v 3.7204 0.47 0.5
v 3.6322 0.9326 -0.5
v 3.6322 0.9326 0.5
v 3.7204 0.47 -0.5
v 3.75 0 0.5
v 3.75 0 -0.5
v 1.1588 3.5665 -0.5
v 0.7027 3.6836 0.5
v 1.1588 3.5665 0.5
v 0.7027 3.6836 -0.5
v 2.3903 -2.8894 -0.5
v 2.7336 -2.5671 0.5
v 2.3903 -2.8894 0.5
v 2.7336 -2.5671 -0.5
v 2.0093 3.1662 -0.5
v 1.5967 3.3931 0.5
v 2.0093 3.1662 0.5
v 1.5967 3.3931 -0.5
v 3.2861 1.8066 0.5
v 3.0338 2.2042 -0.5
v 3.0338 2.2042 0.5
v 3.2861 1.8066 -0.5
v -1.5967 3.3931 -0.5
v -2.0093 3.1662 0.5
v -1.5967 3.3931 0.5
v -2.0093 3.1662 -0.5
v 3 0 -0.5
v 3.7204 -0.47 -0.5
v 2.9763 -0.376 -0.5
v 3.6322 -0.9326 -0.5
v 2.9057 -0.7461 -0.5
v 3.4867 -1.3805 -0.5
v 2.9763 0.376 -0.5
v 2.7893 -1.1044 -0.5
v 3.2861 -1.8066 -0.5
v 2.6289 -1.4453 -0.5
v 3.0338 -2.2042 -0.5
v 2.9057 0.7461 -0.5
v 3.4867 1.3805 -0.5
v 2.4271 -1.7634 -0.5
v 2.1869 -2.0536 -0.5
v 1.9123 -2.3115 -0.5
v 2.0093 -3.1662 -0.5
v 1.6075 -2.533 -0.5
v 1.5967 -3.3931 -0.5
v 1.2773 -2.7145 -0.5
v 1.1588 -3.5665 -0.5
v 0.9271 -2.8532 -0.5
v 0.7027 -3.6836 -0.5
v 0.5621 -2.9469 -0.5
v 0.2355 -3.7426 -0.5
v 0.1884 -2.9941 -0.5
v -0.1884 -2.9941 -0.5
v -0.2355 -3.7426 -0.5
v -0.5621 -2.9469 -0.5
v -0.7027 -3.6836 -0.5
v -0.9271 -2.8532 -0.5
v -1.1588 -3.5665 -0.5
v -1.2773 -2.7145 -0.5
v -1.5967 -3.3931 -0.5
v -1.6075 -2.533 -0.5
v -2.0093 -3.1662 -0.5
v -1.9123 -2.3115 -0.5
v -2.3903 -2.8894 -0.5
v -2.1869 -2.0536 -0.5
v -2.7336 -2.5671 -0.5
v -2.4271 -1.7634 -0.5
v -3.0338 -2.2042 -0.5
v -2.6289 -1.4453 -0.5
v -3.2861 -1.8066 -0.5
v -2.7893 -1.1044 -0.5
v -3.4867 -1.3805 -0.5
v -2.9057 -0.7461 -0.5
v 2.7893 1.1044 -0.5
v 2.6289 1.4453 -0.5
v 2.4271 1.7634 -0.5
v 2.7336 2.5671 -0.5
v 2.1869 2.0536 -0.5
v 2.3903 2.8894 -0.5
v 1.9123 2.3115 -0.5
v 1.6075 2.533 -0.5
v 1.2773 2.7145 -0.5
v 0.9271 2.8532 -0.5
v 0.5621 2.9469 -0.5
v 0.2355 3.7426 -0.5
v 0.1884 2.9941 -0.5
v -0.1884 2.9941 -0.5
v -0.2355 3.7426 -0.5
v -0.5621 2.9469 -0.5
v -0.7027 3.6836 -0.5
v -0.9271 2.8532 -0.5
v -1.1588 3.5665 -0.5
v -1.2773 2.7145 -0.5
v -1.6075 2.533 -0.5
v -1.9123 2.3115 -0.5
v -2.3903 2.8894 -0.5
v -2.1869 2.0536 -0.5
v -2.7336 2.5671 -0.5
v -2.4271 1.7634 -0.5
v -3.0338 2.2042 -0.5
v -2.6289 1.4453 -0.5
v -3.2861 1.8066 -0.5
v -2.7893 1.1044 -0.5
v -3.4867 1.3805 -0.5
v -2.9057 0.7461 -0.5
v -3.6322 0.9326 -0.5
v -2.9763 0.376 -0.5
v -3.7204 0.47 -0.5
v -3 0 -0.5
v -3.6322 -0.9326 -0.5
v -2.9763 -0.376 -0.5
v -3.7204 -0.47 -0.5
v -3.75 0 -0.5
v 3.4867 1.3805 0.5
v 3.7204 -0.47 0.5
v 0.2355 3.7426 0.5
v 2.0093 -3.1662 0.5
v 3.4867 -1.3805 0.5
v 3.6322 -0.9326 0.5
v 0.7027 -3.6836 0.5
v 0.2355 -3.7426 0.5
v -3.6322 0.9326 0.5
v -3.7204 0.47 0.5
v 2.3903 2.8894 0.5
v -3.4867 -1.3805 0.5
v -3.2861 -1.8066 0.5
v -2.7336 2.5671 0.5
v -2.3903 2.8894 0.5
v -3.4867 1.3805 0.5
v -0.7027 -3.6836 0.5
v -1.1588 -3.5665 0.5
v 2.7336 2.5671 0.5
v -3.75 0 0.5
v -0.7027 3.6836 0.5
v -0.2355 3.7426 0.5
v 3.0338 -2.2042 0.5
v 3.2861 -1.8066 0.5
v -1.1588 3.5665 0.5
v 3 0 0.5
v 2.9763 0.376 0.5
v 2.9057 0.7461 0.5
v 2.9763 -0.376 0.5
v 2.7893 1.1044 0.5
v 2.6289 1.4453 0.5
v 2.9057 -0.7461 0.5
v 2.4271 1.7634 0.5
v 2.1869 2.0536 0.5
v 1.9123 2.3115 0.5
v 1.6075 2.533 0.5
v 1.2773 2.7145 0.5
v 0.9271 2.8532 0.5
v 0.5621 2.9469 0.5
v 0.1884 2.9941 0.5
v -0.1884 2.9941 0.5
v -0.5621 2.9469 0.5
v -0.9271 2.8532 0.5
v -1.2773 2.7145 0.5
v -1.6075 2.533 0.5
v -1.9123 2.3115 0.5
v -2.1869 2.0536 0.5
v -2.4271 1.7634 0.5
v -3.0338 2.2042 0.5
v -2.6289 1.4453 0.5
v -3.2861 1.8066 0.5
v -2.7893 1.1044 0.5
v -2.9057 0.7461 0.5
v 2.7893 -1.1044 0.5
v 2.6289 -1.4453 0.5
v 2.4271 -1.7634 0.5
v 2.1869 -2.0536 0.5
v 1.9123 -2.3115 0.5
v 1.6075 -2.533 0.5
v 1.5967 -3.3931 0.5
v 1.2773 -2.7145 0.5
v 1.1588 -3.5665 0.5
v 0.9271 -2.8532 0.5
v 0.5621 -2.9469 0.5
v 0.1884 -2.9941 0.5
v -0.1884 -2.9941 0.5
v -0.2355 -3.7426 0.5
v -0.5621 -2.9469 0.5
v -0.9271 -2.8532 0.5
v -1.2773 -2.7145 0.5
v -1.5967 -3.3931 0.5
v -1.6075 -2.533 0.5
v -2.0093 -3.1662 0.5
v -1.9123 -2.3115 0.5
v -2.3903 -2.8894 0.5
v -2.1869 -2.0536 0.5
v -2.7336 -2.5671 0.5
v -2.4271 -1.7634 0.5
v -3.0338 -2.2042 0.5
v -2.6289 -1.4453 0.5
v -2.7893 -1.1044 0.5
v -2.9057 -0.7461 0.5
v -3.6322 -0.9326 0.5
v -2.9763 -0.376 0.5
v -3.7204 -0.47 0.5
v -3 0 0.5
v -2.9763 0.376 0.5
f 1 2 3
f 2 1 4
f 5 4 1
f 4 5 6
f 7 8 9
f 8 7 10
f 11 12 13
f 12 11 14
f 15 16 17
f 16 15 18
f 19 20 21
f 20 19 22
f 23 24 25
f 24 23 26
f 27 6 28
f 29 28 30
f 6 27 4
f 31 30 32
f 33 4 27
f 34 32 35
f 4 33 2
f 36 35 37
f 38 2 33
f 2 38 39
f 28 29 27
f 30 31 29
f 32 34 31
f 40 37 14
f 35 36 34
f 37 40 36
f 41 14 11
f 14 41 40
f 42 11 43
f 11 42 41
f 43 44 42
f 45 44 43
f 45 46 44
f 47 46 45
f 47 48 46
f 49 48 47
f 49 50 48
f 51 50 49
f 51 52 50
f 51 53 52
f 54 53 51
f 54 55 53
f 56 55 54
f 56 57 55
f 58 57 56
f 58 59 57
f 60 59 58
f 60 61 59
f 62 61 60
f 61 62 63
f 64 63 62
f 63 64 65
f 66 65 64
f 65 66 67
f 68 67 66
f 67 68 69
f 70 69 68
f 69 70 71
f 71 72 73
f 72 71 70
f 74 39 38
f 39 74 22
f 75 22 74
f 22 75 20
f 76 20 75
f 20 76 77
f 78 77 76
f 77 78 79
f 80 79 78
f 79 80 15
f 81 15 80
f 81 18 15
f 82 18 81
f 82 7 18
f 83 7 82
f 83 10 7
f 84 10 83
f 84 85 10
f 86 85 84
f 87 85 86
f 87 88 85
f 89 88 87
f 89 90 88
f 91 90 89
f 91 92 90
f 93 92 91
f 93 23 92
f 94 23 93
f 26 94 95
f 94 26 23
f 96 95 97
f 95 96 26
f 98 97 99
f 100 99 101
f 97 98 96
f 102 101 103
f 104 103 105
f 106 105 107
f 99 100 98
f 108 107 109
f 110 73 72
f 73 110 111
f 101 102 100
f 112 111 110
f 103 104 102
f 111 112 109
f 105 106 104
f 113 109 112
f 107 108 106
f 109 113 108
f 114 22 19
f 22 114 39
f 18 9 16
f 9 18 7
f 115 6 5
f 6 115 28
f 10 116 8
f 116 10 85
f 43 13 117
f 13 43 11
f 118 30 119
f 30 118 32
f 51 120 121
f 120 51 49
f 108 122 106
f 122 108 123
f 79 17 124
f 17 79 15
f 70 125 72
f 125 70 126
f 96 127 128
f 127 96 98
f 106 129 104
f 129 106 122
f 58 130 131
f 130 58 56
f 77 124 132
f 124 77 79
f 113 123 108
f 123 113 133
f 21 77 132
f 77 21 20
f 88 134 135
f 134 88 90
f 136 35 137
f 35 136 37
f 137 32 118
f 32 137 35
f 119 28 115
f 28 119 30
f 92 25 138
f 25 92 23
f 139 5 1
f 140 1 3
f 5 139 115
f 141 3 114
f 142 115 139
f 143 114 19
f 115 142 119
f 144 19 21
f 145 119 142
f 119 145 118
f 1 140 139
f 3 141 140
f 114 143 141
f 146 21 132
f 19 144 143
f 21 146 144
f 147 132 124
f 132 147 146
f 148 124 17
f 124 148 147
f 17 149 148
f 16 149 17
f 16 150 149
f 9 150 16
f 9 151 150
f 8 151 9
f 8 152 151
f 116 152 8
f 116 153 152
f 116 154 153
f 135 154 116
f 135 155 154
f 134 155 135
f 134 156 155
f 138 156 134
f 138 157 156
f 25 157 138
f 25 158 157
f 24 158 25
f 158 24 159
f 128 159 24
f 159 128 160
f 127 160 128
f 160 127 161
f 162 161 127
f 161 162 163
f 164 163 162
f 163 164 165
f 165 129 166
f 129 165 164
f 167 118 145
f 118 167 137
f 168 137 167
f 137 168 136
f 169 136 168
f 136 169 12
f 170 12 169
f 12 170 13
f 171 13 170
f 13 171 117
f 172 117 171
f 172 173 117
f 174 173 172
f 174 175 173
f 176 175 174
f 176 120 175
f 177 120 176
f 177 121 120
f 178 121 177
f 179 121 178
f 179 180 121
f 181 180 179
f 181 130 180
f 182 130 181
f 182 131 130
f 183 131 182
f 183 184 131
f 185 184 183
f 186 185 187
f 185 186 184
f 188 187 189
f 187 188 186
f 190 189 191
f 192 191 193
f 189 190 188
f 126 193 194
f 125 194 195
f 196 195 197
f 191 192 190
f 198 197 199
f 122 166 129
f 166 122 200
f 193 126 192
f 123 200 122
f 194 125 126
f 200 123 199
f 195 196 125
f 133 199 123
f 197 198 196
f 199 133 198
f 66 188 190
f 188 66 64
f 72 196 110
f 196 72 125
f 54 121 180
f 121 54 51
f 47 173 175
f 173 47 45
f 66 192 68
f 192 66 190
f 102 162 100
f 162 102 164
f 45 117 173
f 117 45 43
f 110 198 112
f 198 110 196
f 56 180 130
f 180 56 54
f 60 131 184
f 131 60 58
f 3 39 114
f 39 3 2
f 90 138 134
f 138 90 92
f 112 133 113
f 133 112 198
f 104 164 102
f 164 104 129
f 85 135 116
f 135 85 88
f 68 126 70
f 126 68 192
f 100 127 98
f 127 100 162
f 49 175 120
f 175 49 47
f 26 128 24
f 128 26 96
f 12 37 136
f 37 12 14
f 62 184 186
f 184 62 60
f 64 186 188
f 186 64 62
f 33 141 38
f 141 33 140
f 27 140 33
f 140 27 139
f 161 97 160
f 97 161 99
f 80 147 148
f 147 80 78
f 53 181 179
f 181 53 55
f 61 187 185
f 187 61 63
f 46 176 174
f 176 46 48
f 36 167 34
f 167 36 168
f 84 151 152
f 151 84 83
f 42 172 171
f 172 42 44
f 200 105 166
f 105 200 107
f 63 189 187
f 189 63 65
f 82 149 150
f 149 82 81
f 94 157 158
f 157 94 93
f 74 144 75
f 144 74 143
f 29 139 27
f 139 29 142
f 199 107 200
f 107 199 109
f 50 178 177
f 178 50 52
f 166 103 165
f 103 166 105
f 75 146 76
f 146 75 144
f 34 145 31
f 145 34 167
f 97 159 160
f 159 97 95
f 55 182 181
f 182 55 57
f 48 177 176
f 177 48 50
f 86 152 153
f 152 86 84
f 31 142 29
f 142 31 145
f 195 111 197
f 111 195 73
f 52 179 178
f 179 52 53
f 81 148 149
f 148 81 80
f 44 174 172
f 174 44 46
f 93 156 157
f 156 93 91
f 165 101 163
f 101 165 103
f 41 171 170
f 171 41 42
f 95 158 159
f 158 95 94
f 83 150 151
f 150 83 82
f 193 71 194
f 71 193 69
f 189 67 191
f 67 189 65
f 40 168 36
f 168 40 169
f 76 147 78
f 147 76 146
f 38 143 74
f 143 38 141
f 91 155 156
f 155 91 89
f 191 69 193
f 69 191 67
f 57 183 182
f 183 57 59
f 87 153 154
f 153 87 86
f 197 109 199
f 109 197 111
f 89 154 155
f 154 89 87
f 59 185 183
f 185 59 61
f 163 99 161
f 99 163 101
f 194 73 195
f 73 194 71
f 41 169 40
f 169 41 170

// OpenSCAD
$fn = 50;


difference() {
	union() {
		translate(v = [0, 0, -0.5000000000]) {
			cylinder(h = 1, r = 3.7500000000);
		}
	}
	union() {
		translate(v = [0, 0, -100.0000000000]) {
			cylinder(h = 200, r = 3.0000000000);
		}
	}
}
